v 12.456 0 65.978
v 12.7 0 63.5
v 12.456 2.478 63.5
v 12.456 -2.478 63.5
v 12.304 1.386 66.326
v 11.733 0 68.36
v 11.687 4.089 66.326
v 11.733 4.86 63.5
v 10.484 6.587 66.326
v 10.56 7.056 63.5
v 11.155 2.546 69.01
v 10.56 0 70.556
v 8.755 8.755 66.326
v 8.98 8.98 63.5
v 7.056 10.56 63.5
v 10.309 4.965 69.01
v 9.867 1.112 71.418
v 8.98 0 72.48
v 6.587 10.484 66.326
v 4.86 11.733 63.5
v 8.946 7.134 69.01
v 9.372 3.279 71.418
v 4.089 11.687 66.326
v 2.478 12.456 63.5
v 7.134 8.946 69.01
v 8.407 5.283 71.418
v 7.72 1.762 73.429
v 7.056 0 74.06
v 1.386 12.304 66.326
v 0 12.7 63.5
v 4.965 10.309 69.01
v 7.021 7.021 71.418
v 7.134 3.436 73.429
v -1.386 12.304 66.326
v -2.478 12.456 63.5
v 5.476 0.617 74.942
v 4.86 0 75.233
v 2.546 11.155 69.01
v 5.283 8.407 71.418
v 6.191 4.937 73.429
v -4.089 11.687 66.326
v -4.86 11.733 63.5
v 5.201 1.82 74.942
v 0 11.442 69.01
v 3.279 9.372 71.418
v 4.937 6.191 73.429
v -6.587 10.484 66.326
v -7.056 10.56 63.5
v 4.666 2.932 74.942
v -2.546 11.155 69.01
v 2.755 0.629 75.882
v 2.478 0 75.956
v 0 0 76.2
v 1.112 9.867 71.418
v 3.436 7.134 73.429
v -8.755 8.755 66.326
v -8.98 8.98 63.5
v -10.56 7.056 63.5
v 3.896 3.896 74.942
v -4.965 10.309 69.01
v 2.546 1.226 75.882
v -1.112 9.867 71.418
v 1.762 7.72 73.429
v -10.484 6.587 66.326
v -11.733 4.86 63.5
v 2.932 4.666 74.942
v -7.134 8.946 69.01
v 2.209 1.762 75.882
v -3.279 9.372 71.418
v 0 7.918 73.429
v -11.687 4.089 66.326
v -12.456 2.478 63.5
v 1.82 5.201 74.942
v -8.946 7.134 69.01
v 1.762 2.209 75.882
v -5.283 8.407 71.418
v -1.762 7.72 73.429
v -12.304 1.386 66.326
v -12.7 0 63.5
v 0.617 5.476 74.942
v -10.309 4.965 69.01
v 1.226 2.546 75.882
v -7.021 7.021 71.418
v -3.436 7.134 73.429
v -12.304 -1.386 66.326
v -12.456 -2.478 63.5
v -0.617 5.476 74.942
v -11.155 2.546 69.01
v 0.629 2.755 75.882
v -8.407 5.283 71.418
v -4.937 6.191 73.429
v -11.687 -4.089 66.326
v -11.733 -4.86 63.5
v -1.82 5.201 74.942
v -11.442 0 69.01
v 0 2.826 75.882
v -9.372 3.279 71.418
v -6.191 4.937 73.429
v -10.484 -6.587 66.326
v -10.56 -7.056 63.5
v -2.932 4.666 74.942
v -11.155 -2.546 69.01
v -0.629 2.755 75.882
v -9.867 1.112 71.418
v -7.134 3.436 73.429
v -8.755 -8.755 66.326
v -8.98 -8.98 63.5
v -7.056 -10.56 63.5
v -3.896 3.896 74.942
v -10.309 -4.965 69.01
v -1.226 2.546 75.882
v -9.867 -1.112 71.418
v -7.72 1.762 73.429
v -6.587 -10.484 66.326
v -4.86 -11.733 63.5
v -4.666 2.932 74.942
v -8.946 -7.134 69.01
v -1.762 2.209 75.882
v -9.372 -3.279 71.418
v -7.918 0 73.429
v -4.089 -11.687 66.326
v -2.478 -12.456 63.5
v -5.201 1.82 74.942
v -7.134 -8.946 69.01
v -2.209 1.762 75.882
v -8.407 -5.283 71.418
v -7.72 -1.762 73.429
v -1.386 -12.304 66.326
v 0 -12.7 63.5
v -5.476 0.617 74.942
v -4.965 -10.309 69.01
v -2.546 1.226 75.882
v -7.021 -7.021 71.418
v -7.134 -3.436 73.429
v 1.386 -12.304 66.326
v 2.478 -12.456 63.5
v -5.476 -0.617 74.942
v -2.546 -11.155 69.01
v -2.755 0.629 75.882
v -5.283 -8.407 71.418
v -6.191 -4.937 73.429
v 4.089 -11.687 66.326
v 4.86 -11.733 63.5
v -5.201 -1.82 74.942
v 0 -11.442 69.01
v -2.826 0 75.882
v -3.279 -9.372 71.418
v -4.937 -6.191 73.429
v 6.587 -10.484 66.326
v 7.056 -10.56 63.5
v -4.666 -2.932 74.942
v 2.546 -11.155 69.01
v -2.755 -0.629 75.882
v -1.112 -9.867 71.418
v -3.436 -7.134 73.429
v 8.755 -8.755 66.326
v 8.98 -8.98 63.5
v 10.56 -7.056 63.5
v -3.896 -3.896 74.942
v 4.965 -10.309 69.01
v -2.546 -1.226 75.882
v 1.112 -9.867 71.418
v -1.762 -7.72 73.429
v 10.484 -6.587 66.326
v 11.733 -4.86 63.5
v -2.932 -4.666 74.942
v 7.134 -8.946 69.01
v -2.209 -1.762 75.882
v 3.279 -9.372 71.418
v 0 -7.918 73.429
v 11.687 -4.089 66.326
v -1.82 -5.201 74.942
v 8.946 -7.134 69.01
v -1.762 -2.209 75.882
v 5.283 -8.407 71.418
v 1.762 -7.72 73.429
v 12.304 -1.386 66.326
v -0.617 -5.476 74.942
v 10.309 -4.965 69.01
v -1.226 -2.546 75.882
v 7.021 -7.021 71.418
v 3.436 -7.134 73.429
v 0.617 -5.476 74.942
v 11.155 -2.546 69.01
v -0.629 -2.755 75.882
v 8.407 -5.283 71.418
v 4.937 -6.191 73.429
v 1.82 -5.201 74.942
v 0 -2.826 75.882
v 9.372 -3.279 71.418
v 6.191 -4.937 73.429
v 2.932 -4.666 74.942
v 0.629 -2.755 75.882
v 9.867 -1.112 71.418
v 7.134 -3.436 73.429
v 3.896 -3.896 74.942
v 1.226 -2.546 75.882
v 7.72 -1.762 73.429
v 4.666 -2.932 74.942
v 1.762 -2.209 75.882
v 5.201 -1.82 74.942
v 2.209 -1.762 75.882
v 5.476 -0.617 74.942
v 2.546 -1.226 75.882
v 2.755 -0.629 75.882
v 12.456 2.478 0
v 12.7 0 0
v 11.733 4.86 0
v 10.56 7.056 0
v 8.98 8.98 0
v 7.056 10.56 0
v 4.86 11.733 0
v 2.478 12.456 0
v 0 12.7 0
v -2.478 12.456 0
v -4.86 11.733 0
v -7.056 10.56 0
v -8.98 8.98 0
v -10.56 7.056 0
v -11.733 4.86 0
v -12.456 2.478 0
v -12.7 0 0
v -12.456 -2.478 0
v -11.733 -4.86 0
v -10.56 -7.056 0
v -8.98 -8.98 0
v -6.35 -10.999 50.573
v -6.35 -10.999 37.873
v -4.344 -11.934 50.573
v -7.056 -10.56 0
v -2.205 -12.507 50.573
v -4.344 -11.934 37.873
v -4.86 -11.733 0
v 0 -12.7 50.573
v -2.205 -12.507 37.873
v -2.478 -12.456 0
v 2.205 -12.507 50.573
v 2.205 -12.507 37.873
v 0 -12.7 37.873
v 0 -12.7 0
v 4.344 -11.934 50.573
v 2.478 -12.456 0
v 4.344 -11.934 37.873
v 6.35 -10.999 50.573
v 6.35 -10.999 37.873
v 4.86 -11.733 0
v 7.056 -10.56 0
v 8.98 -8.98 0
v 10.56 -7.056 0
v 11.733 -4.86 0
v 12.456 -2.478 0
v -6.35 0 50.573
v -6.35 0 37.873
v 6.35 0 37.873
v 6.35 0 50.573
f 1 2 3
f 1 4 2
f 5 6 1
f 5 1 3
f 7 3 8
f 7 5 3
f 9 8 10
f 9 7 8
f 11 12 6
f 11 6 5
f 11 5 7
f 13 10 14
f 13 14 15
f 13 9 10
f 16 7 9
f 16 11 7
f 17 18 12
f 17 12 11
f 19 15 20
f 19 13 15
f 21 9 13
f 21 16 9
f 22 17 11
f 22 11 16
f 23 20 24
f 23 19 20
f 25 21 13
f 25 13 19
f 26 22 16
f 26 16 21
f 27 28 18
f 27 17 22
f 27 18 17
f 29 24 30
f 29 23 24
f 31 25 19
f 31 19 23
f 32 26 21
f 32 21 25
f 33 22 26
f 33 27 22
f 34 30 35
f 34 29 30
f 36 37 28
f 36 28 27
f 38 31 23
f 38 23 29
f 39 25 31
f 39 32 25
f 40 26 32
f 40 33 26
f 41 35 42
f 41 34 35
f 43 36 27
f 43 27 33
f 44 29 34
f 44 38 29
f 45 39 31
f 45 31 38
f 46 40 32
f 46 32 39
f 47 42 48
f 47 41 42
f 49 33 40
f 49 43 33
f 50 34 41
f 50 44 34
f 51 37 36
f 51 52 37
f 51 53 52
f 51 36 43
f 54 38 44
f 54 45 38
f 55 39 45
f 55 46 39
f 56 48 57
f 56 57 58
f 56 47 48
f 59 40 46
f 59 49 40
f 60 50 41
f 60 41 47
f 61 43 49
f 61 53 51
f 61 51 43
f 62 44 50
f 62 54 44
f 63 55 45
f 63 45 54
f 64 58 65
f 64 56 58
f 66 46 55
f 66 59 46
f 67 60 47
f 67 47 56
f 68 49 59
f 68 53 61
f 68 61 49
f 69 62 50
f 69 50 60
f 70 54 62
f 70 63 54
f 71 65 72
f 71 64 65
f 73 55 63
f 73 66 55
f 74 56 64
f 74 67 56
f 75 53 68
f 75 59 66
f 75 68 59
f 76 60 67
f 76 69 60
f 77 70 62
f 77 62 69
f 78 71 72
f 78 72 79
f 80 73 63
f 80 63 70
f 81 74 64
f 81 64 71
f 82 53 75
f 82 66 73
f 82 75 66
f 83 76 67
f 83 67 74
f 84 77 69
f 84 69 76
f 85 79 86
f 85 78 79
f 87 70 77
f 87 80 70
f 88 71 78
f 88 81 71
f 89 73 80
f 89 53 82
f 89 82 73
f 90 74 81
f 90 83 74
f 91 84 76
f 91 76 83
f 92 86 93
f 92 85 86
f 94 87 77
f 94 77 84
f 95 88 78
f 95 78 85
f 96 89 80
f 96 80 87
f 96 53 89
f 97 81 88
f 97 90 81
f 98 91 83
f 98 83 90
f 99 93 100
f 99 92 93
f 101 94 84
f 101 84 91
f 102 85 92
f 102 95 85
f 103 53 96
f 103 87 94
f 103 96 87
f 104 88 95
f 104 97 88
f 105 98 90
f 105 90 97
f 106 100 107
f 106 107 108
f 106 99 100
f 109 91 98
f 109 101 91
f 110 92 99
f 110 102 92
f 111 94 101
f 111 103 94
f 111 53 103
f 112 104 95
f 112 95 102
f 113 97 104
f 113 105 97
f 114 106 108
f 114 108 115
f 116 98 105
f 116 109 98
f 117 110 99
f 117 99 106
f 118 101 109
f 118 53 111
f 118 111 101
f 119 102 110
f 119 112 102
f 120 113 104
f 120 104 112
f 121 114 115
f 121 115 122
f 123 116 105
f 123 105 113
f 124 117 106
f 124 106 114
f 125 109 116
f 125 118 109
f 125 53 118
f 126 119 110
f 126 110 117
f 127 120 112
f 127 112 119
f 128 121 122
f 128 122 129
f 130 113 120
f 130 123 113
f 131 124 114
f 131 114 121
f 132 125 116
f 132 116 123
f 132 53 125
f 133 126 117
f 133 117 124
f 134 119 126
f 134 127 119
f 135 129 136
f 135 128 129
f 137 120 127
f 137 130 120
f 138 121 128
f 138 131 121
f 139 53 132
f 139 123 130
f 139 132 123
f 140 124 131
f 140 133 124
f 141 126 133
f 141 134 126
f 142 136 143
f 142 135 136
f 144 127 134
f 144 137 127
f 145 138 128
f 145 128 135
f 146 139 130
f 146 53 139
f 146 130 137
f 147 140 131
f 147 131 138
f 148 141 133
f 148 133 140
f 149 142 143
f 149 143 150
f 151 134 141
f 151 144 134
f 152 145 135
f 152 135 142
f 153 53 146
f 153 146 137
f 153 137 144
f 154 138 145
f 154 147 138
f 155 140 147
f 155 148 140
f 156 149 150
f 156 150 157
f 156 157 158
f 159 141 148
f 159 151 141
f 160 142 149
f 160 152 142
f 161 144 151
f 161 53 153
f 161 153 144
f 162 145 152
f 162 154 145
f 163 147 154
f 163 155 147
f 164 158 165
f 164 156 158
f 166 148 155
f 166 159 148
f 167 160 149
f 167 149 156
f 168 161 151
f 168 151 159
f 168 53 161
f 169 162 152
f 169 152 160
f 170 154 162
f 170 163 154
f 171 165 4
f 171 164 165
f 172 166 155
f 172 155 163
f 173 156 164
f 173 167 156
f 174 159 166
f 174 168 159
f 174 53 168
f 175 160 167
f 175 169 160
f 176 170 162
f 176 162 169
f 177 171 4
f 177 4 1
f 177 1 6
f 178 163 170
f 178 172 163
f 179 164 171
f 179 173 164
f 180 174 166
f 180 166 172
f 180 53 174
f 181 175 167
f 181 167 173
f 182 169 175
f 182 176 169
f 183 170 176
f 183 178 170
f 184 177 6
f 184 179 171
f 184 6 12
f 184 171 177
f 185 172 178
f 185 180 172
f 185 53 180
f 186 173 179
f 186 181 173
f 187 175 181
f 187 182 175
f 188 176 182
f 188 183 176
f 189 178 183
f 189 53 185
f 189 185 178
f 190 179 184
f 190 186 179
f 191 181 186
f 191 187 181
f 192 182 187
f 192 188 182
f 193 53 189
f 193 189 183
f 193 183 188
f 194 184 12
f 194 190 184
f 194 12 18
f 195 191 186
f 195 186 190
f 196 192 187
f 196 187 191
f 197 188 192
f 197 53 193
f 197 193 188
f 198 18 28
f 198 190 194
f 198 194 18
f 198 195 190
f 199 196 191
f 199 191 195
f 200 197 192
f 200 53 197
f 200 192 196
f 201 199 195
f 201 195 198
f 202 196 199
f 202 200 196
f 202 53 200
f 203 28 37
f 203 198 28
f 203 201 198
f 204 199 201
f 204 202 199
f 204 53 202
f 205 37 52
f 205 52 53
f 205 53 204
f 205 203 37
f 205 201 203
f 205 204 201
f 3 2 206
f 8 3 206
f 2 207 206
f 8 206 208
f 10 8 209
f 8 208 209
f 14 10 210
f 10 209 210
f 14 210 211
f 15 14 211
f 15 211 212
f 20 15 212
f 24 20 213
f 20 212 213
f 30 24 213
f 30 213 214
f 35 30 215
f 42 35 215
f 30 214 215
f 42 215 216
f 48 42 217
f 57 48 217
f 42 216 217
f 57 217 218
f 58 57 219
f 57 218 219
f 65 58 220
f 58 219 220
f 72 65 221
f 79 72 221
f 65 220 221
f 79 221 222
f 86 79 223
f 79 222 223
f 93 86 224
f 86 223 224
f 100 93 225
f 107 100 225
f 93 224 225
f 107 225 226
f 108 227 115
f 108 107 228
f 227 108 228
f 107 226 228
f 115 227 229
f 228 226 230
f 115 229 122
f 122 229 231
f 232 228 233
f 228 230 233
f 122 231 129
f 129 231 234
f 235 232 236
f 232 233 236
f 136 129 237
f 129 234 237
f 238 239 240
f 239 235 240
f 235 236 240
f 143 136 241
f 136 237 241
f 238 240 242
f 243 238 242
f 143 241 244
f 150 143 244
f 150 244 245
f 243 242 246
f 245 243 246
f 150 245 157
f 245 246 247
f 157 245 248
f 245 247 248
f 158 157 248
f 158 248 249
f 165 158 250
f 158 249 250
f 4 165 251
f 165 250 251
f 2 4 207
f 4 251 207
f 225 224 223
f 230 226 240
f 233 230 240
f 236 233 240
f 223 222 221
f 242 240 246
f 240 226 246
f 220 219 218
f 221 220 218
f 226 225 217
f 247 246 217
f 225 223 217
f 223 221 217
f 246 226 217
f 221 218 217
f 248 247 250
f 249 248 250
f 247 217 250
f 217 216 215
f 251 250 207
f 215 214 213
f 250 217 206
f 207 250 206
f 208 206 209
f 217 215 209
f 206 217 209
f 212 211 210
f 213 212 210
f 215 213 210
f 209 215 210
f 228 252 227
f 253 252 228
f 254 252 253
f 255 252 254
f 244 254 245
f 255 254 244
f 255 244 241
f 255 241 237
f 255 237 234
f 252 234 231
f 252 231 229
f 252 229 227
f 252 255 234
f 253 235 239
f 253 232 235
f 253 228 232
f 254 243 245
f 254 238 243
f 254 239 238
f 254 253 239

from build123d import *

# Parameters (mm, degrees)
F0_R     = 12.7
F1_DEPTH = 76.2
F2_R     = 12.7
F4_DEPTH = 50.8


with BuildPart() as f1:
    # F0 (on Top) → F1 (new body)
    with BuildSketch(Plane.XY):
        Circle(F0_R)
    extrude(amount=F1_DEPTH)

    # F2
    f2_edges = [f1.edges().sort_by_distance(p)[0] for p in [
        (-12.7, 0, 76.2),
    ]]
    fillet(f2_edges, radius=F2_R)

    # F3 (on Front) → F4 (cut)
    with BuildSketch(Plane.XZ):
        Polygon((-6.35, 37.873212), (0, 37.873212), (6.35, 37.873212), (6.35, 50.573212), (-6.35, 50.573212), align=None)
    extrude(amount=F4_DEPTH, mode=Mode.SUBTRACT)


solid = f1.part
